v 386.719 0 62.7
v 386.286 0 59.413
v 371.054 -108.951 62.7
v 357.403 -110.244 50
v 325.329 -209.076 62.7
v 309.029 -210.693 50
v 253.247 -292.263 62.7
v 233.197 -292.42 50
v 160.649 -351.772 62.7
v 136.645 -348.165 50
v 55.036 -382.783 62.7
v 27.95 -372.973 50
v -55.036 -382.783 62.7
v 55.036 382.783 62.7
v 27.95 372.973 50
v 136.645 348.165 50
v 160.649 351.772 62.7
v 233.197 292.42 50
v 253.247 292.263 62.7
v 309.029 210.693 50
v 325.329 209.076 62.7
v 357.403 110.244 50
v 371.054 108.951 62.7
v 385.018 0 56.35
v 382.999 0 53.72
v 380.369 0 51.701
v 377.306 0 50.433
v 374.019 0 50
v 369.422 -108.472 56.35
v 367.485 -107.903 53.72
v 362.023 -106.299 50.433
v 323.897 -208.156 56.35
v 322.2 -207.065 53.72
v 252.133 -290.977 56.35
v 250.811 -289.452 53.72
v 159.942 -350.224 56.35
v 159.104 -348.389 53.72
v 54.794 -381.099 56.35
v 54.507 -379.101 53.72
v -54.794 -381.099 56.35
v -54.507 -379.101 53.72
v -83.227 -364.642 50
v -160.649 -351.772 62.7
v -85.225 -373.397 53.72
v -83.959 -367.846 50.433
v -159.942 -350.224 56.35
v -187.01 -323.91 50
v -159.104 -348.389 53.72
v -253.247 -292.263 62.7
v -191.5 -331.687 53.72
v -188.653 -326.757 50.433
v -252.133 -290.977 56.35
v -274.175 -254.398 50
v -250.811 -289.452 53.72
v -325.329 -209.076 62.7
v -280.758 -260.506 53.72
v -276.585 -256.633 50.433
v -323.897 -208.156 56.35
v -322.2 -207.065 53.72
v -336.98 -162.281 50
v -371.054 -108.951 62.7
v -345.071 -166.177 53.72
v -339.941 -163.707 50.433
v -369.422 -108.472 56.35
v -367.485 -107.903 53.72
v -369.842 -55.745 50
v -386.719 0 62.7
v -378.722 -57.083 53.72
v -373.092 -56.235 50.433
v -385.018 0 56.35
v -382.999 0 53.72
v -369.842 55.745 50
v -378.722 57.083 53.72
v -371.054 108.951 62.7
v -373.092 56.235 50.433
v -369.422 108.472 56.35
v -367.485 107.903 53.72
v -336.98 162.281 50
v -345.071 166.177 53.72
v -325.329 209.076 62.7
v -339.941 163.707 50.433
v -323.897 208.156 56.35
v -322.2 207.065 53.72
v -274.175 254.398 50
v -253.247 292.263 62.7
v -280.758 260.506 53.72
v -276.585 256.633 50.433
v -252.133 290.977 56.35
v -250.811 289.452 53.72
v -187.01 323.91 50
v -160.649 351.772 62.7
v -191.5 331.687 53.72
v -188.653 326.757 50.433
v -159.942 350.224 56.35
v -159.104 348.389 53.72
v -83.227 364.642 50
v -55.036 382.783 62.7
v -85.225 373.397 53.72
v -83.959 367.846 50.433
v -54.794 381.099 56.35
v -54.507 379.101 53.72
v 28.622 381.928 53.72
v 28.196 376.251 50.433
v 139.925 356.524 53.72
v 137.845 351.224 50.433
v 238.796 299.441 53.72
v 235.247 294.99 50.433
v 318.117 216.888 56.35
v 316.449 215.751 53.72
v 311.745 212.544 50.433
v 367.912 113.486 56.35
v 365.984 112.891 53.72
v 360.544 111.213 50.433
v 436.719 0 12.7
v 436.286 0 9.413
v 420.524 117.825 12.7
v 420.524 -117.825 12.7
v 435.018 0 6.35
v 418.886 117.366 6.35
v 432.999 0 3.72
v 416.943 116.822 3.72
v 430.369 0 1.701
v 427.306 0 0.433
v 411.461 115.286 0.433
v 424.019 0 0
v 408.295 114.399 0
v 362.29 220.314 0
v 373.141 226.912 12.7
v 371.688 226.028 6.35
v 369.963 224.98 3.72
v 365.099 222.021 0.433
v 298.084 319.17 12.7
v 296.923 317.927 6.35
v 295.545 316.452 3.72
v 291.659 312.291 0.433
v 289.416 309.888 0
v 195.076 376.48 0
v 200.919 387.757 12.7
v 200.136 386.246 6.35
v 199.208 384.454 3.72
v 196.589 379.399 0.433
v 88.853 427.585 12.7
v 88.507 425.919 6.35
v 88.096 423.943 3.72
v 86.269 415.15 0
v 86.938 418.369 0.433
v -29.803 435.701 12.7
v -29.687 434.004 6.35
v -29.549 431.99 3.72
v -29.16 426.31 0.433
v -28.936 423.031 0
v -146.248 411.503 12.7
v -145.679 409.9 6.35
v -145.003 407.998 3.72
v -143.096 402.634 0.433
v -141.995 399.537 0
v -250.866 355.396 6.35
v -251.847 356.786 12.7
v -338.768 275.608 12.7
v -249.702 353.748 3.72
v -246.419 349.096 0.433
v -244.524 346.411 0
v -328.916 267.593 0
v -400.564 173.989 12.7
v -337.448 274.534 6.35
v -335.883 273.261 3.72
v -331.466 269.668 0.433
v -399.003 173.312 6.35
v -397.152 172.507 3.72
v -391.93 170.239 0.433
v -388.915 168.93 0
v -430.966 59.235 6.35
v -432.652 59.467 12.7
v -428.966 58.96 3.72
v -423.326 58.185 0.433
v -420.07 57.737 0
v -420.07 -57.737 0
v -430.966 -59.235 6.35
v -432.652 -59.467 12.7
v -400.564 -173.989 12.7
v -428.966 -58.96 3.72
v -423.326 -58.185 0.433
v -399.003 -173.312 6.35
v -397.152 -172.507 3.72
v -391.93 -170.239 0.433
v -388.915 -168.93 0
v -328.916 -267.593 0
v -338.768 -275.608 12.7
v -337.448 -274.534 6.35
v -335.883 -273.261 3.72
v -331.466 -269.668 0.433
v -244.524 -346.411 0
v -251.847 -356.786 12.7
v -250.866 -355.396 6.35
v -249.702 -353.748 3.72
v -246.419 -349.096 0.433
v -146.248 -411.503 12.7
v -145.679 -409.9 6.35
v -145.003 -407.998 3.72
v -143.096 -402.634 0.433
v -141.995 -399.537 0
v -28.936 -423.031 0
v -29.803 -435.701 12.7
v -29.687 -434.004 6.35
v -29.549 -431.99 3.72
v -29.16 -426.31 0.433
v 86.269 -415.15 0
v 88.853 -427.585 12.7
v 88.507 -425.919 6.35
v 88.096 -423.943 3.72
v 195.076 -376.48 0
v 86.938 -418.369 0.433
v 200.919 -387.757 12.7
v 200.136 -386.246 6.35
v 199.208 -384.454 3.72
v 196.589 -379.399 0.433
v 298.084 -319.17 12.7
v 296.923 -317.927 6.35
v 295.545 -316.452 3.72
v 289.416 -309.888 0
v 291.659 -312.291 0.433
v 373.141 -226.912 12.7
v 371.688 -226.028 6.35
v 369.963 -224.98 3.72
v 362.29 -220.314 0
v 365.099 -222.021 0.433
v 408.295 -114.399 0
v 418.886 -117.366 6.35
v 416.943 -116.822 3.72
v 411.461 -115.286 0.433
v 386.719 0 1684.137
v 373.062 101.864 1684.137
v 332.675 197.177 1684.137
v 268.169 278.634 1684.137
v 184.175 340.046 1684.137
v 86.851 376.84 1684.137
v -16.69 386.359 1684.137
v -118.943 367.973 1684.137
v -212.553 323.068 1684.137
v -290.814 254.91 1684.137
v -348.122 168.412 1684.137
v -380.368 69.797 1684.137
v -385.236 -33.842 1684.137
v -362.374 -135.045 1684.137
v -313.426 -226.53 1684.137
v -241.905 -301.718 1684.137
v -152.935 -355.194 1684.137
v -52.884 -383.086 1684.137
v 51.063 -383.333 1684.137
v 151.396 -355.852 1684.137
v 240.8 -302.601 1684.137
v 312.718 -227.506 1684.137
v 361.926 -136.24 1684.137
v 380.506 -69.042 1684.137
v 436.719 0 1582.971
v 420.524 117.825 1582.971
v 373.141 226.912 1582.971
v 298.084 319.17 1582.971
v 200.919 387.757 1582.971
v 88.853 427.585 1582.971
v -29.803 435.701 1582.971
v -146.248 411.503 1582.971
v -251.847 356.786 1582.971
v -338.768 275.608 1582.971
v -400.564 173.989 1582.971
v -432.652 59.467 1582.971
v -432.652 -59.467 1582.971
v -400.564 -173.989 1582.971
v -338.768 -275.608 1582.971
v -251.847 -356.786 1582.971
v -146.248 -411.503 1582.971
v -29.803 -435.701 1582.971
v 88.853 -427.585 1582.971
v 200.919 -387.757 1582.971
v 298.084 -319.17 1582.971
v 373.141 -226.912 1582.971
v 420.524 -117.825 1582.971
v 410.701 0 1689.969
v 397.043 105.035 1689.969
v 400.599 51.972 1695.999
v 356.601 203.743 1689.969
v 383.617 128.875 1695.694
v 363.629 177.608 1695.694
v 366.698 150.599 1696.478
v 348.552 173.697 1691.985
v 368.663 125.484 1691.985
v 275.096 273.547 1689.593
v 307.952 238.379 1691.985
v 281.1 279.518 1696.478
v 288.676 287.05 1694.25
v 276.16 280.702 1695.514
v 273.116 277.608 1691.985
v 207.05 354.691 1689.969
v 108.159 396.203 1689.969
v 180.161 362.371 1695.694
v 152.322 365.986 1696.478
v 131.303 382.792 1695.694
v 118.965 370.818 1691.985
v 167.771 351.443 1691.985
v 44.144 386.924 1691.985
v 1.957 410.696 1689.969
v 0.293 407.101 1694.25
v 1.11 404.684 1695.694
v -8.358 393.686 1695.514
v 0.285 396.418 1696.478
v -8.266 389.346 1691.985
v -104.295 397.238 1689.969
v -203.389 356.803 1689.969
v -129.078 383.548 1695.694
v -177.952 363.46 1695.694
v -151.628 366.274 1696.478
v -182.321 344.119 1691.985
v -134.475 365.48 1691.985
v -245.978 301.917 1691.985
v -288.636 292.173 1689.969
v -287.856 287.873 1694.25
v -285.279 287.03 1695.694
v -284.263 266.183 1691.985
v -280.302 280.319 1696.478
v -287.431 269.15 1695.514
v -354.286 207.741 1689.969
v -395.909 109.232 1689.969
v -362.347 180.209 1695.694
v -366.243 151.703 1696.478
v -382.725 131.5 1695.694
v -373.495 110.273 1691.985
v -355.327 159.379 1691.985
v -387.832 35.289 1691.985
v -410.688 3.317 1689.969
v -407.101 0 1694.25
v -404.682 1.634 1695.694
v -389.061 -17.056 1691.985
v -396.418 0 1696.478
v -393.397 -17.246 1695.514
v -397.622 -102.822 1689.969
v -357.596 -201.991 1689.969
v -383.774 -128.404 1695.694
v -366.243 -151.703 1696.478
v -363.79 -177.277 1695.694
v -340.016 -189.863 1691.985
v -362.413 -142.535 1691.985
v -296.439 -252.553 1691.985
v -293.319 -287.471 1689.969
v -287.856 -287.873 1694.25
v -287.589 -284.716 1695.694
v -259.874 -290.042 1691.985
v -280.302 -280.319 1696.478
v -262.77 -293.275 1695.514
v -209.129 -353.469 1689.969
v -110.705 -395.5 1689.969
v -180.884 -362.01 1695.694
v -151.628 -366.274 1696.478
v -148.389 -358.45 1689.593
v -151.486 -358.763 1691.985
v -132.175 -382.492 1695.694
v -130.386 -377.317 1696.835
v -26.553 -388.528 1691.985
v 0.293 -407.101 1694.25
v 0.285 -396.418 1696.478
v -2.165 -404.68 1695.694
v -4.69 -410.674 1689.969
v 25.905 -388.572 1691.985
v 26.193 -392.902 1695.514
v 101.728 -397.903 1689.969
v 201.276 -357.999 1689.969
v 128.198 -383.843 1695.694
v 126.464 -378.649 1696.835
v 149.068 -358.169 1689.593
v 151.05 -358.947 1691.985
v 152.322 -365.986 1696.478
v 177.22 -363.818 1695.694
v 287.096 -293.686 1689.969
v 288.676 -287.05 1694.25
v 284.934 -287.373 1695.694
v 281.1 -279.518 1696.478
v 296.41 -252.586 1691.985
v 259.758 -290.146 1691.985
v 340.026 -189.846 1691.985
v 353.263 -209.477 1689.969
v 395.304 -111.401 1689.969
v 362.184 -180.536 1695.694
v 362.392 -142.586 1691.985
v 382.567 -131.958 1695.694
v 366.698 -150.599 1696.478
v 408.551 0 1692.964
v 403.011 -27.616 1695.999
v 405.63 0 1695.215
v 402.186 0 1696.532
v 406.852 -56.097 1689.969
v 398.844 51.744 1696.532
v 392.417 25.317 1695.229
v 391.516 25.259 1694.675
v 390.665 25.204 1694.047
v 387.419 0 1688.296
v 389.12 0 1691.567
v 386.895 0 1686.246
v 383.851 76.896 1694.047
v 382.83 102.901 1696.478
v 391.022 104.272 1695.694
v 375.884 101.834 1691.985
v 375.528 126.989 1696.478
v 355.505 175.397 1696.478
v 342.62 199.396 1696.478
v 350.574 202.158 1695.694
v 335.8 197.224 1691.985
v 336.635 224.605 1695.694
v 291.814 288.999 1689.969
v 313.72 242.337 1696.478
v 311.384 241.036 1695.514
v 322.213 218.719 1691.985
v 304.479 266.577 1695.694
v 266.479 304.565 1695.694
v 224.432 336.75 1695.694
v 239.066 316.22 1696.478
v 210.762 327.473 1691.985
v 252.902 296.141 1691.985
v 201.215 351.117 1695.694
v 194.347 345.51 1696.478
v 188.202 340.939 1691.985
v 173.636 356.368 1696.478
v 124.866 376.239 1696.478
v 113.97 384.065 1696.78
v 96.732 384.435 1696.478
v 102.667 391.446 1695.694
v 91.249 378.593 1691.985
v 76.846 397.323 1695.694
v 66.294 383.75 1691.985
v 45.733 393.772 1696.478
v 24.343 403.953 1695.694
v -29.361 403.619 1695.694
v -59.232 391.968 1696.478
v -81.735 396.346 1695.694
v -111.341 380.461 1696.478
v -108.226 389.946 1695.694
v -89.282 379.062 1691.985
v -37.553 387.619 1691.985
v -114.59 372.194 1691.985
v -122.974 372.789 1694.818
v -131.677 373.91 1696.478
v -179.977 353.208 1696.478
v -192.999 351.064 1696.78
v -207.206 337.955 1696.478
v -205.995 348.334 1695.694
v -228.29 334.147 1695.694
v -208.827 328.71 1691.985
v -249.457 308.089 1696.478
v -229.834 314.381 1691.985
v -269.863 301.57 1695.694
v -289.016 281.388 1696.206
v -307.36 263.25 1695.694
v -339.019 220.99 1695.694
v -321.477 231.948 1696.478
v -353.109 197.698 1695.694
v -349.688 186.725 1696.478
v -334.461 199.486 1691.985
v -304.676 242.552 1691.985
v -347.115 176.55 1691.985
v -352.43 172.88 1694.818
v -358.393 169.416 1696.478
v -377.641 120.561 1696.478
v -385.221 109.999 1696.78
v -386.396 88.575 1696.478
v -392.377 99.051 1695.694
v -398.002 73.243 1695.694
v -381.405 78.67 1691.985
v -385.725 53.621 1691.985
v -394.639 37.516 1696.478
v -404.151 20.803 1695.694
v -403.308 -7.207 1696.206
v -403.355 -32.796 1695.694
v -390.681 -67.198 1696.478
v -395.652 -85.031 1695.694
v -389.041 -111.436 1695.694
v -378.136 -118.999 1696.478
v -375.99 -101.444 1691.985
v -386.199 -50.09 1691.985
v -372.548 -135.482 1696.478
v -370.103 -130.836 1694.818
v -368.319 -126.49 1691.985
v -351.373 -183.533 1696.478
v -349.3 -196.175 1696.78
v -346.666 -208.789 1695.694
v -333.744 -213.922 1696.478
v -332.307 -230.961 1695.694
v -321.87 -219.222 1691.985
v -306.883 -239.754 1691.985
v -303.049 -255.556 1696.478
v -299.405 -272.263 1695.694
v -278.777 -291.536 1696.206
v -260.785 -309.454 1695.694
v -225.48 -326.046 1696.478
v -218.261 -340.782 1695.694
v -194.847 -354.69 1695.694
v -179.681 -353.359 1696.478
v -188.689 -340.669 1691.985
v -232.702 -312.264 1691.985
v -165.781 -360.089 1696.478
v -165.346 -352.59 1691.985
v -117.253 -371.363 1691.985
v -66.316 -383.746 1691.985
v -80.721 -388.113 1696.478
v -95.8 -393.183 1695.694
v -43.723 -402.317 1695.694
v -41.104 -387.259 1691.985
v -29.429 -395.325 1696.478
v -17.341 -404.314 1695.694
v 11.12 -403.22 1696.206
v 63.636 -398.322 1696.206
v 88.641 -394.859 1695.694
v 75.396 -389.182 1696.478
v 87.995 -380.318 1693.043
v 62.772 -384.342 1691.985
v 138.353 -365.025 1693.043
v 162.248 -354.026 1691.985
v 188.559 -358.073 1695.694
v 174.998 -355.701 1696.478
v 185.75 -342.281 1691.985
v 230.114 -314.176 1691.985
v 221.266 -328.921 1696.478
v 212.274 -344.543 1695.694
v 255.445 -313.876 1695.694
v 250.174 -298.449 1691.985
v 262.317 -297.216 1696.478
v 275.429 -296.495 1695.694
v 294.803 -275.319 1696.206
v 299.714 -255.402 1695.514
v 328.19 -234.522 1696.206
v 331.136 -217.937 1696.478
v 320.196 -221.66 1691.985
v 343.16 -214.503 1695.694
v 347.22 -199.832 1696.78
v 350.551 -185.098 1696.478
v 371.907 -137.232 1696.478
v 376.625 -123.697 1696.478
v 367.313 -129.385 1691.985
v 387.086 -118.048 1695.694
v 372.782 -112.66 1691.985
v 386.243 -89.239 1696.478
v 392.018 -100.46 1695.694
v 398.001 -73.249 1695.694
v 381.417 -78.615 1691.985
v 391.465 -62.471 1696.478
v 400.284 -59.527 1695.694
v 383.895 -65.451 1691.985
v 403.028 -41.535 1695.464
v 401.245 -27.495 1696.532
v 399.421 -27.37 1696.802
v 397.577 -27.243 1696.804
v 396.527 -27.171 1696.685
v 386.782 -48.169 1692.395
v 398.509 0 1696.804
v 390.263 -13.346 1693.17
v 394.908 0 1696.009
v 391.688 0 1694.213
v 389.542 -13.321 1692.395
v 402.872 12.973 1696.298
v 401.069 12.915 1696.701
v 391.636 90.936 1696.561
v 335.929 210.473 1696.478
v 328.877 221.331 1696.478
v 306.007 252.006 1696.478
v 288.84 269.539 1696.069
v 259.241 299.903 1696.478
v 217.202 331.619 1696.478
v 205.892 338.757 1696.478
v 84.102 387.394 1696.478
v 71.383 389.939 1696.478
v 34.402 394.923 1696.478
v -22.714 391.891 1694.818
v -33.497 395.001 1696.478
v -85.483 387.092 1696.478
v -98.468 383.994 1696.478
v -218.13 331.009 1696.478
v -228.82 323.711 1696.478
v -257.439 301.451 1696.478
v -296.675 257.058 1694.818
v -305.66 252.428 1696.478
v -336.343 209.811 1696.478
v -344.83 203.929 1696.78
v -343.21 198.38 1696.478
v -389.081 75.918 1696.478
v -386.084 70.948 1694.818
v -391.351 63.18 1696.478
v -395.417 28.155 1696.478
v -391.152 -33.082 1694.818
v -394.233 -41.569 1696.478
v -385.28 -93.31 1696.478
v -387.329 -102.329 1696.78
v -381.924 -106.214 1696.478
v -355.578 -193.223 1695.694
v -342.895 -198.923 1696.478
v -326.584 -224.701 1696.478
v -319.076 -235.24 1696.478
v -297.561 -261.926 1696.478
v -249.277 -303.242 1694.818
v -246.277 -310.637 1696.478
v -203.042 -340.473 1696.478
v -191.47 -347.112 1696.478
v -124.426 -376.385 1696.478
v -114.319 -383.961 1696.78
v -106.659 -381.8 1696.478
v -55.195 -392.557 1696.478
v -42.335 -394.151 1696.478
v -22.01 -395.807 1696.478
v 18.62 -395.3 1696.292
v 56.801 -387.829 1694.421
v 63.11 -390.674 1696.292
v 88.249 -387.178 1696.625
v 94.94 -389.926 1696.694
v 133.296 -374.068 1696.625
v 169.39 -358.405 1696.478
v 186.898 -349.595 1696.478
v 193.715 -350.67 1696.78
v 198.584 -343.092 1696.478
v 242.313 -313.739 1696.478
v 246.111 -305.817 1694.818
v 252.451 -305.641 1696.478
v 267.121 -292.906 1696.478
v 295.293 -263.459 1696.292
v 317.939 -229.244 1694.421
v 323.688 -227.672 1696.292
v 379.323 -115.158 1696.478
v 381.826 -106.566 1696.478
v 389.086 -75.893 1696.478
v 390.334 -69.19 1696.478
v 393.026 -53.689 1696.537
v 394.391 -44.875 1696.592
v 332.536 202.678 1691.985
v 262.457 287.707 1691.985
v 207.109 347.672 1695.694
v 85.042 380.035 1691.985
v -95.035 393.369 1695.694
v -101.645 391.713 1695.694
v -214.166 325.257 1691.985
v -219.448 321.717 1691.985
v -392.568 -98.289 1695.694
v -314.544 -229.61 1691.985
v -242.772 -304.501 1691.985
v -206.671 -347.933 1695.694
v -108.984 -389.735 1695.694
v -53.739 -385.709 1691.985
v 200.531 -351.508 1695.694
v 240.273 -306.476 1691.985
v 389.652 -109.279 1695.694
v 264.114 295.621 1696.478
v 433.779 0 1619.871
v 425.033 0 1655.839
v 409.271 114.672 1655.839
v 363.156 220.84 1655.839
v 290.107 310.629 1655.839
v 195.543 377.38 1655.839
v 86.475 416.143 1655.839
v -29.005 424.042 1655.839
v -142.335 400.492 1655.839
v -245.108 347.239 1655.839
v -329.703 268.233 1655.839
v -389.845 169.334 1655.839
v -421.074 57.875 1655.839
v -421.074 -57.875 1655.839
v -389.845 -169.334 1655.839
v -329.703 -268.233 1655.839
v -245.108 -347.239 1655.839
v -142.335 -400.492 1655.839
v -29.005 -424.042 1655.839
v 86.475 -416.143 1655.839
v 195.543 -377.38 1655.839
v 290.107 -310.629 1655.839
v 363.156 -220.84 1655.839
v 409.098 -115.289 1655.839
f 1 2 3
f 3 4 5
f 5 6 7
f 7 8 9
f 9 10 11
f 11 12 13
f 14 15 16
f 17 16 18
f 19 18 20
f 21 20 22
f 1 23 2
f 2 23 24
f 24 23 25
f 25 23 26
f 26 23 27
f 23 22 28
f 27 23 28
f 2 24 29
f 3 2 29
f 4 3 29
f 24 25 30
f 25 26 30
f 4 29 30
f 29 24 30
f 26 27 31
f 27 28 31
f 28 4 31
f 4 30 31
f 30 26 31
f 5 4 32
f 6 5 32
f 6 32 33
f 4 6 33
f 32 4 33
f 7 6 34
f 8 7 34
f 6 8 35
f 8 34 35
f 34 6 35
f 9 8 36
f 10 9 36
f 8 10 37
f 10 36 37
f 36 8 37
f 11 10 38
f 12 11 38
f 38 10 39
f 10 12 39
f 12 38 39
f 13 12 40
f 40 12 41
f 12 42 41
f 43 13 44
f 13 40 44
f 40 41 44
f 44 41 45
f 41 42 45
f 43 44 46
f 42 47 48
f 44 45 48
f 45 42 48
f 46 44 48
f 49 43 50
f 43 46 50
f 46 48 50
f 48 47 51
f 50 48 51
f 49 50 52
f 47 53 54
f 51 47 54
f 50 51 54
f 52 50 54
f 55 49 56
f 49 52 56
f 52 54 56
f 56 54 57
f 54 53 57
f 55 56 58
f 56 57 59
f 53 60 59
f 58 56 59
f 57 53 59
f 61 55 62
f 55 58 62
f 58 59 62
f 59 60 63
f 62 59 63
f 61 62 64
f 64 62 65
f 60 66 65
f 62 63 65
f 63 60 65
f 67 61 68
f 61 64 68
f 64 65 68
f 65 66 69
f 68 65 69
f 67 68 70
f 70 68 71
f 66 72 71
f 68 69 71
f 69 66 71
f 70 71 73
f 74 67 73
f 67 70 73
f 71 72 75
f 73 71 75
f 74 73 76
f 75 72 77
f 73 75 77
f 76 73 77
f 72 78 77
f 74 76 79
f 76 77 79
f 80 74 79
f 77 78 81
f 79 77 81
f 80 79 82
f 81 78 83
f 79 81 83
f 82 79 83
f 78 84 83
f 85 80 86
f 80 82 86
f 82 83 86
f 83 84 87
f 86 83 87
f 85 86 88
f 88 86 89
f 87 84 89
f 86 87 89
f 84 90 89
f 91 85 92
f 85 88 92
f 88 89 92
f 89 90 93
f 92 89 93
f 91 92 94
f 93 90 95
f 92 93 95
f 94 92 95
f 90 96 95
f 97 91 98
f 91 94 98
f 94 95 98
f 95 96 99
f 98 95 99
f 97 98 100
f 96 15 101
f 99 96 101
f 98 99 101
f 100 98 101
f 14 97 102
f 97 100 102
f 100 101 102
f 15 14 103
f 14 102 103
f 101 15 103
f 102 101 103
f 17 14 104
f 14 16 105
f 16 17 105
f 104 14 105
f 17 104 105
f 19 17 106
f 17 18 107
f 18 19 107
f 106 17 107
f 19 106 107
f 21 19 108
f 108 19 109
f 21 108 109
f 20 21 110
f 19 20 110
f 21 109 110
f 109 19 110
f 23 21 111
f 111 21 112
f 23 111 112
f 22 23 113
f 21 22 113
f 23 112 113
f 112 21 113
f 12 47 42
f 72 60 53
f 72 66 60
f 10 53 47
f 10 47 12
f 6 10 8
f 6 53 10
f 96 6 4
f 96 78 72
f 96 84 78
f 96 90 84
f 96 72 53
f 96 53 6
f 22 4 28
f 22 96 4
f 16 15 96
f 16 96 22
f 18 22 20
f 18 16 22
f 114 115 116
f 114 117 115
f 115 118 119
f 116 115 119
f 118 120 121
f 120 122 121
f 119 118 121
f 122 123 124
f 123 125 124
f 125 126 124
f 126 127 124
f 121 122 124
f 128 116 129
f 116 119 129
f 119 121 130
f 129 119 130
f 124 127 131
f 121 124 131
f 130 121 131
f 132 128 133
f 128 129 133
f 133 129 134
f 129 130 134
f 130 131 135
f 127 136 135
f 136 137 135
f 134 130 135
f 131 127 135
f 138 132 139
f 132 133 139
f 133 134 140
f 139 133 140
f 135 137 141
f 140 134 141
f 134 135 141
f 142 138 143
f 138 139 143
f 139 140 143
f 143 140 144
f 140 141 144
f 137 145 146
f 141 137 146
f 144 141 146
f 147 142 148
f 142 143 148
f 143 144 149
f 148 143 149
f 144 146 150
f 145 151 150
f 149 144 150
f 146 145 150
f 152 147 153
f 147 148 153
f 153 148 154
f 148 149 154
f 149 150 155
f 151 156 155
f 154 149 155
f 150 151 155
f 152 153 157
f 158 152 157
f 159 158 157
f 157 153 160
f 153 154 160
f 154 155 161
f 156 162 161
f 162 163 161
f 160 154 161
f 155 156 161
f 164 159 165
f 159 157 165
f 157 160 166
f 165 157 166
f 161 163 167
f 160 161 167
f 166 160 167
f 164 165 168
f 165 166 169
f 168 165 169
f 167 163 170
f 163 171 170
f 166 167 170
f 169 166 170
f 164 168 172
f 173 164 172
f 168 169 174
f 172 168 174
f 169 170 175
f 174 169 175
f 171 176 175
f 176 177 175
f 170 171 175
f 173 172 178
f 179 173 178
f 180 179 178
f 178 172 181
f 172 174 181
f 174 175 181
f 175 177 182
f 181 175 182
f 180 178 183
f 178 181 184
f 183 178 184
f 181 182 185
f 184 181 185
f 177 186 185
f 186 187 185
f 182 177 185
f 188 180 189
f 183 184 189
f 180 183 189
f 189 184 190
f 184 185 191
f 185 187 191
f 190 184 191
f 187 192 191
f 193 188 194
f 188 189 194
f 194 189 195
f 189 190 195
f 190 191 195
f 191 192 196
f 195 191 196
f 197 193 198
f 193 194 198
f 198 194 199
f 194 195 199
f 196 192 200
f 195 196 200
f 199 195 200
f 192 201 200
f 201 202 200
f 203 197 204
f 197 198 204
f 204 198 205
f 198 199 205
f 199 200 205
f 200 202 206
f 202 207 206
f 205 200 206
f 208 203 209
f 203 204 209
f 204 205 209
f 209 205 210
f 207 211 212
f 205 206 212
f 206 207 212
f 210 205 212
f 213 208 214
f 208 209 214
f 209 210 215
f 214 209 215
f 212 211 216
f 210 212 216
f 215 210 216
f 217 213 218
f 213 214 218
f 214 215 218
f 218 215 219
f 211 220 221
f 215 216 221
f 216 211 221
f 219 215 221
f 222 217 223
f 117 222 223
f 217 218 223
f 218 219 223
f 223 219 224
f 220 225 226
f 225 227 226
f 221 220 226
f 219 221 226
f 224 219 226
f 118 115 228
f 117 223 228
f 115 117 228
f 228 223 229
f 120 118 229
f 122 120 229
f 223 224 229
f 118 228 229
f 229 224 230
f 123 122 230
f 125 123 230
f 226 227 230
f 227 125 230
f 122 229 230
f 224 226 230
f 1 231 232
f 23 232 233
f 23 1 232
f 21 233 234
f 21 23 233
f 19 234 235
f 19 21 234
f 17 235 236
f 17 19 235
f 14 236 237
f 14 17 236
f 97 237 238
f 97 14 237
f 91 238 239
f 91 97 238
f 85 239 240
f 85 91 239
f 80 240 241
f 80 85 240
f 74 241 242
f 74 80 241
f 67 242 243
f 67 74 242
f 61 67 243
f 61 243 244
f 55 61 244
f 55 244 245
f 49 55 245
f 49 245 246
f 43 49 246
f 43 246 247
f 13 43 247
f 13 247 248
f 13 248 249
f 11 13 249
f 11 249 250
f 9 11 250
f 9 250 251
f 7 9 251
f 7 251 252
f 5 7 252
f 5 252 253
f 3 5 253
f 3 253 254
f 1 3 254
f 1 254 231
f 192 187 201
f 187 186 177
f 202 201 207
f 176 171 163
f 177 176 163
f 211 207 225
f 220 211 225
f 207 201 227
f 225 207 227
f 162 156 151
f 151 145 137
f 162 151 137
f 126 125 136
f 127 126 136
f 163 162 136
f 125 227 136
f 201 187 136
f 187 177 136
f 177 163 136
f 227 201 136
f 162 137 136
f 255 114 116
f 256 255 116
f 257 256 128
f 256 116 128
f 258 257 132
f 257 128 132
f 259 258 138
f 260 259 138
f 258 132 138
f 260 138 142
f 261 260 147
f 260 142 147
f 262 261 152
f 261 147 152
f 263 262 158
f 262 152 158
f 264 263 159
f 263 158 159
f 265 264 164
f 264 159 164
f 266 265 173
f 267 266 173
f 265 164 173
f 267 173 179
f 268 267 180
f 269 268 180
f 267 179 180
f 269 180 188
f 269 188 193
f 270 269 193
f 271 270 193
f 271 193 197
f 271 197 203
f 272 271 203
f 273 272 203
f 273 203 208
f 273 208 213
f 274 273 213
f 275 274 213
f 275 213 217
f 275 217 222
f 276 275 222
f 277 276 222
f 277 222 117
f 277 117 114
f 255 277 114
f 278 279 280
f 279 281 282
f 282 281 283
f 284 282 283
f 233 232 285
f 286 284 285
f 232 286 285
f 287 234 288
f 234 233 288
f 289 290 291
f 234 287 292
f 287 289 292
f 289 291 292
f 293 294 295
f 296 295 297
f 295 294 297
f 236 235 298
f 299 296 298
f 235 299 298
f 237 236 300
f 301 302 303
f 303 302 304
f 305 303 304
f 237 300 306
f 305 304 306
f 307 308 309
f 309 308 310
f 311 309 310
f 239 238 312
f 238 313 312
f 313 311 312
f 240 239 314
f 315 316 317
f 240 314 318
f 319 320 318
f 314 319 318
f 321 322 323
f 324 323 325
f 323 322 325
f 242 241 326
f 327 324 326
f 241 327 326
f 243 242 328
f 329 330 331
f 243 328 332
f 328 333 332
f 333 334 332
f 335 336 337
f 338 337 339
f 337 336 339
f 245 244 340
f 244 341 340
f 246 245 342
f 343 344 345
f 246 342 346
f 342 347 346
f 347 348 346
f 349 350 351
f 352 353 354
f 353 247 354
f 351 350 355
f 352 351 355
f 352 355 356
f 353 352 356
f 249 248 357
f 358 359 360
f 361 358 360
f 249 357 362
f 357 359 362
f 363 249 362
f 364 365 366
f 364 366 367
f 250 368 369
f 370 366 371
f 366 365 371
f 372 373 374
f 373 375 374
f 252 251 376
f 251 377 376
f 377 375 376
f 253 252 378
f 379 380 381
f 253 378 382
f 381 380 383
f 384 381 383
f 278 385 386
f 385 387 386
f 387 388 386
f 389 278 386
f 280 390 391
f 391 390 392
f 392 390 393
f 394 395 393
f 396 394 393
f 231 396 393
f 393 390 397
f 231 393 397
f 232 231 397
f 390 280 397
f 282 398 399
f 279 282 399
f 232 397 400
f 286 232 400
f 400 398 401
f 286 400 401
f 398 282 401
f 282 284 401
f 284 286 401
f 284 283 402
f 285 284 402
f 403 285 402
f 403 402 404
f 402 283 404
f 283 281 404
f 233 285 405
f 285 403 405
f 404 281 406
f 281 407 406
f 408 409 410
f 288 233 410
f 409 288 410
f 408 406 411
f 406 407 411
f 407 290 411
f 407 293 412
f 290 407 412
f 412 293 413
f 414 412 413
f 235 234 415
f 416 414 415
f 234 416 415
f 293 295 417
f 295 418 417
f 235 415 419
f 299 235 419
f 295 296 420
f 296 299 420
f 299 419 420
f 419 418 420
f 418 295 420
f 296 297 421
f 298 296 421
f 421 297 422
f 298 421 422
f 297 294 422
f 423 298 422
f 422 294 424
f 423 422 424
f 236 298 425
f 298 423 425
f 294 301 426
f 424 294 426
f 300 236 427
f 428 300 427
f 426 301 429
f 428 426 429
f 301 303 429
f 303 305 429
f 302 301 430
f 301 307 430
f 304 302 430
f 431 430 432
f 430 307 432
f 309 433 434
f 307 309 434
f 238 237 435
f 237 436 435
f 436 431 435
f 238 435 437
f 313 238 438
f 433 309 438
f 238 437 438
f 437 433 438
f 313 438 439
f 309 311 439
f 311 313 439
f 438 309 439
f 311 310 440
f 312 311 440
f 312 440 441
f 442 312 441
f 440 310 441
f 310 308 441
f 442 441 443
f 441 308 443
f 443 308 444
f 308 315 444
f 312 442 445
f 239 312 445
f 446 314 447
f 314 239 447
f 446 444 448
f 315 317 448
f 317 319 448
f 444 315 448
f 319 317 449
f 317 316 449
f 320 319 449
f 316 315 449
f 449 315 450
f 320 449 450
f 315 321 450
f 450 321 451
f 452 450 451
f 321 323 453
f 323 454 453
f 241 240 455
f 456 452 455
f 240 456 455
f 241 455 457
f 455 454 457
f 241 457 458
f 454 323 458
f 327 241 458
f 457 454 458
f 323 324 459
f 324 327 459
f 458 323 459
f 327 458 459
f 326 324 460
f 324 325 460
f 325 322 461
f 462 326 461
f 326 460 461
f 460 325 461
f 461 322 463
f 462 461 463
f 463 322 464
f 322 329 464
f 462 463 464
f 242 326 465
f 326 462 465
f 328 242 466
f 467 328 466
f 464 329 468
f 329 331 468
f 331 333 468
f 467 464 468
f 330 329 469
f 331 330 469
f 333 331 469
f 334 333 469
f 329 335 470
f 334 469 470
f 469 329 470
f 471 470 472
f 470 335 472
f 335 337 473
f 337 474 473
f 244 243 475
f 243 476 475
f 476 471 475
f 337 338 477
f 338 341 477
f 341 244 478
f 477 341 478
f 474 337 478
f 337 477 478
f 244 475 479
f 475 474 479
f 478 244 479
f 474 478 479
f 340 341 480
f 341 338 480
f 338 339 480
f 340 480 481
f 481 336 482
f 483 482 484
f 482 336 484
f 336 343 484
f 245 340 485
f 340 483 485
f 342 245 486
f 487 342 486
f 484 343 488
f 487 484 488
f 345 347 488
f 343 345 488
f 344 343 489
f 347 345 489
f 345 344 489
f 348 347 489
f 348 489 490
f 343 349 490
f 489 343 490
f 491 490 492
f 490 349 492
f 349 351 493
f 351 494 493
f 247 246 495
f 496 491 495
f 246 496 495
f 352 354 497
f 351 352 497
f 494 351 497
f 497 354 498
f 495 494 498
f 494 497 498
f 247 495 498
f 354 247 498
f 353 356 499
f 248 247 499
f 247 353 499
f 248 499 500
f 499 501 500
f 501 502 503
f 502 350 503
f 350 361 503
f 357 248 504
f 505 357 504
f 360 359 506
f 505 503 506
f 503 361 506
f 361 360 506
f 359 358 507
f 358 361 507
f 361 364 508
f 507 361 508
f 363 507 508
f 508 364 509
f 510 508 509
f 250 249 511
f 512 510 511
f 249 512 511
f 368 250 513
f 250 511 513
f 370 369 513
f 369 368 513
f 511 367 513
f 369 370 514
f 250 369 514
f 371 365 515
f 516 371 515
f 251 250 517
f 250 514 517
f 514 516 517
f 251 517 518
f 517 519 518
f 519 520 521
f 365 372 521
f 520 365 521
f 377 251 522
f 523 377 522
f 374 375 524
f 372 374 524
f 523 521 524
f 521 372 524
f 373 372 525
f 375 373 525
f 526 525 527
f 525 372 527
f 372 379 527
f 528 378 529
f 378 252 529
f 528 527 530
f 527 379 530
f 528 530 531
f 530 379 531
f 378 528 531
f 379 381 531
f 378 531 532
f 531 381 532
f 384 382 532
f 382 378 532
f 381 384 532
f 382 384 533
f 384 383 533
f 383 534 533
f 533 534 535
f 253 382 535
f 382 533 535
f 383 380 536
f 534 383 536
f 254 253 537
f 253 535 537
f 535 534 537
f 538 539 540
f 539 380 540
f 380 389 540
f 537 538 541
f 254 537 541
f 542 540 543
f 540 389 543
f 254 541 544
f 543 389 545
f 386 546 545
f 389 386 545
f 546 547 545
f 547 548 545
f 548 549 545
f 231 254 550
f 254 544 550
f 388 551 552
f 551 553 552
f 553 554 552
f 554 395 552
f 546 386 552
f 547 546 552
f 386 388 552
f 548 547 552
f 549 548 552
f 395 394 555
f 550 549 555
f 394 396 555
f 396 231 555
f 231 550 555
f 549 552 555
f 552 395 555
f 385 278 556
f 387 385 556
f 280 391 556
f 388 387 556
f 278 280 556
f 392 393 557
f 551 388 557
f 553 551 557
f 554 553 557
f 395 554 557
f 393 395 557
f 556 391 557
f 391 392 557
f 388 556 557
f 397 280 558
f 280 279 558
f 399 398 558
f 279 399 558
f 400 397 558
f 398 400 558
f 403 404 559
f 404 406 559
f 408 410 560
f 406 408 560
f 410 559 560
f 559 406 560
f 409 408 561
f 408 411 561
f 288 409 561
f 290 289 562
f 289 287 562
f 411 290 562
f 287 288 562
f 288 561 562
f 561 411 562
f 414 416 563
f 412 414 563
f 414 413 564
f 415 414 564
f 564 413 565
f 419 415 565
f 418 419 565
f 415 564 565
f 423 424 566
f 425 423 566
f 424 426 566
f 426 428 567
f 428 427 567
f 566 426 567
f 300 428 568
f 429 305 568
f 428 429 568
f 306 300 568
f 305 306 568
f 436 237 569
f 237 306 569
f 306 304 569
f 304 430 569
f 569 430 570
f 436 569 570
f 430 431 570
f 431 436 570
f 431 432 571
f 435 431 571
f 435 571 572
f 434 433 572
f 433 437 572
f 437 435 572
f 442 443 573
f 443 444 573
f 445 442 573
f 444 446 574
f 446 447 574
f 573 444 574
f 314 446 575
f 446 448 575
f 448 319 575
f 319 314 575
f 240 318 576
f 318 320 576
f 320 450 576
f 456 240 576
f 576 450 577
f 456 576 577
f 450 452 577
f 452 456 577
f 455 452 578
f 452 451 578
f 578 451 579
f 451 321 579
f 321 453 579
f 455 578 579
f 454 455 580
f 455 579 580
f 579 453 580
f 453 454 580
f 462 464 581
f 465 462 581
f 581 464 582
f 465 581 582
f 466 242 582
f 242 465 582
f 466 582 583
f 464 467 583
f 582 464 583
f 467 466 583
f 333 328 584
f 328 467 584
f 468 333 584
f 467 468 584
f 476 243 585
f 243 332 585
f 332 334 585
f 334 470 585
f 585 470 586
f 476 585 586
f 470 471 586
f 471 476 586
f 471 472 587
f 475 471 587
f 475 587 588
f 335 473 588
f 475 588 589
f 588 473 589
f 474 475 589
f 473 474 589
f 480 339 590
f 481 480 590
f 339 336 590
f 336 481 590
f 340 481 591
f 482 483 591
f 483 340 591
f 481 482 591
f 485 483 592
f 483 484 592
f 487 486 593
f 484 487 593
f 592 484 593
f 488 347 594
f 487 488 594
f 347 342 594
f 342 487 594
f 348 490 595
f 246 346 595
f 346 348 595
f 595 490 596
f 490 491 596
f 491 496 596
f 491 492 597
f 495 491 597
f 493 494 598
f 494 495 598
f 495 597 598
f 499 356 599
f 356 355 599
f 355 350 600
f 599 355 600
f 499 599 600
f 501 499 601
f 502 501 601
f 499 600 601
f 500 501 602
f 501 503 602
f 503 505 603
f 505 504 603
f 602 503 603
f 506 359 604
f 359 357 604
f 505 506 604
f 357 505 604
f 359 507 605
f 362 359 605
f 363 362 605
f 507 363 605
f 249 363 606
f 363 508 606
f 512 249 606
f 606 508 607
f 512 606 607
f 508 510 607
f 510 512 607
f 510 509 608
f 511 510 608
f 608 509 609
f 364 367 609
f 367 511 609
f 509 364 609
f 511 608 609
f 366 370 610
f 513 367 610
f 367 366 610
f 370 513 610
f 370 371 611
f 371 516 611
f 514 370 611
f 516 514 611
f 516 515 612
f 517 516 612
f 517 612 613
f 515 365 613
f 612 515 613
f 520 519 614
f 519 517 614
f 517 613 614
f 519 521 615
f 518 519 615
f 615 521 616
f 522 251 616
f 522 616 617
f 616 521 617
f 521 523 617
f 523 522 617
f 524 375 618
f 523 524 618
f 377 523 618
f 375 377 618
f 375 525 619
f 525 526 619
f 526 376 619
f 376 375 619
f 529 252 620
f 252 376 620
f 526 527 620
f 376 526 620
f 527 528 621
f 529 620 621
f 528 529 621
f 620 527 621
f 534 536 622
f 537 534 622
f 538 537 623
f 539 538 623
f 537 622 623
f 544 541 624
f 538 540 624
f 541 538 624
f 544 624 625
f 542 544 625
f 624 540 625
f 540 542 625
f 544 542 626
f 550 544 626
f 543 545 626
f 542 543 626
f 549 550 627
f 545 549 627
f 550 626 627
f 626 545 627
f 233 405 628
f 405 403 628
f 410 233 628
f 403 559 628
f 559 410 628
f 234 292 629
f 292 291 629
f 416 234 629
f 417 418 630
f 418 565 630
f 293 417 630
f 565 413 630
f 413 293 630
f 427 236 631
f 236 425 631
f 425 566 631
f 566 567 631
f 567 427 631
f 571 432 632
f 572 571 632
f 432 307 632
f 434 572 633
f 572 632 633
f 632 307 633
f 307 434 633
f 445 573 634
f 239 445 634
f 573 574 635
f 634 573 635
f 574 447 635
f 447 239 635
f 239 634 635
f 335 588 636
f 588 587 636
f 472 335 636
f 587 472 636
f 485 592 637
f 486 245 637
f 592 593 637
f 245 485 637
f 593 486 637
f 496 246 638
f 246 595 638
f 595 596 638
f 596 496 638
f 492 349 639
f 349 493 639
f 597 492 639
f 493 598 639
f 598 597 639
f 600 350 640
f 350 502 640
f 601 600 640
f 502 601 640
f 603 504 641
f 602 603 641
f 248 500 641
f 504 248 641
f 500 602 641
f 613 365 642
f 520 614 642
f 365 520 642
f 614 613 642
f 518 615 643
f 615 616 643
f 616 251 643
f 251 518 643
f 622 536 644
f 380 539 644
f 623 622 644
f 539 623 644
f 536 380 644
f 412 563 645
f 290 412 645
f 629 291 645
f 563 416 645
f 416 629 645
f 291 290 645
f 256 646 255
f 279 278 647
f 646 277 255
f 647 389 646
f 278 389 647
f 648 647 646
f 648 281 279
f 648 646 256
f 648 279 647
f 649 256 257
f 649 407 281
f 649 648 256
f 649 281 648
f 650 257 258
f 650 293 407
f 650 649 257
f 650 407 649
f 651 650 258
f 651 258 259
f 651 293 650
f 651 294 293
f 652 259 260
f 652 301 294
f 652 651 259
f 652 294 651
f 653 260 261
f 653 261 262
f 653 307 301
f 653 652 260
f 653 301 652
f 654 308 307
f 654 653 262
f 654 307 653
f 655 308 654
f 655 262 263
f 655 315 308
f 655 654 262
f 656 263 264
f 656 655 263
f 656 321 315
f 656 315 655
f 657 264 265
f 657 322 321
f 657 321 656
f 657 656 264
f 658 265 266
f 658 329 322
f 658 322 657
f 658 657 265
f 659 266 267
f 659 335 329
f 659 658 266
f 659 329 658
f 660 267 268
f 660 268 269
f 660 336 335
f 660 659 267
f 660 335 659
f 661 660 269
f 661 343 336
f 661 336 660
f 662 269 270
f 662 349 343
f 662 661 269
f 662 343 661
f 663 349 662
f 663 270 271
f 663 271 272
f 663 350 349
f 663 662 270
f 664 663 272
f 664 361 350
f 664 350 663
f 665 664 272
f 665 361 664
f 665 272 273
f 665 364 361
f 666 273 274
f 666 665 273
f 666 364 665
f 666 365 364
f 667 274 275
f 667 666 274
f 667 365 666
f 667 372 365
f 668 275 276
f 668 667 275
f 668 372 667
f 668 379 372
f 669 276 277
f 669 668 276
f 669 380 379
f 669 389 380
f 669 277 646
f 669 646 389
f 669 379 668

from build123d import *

# Parameters (mm, degrees)
F0_R     = 436.7191768954
F1_DEPTH = 1727.2
F2_T     = -50
F4_R     = 12.7


# Not quite as in the source:
# - a fillet or chamfer that OpenCascade refuses, or shapes differently, is made with other operations: its cross-section is extruded or revolved along the edge and cut away or added


with BuildPart() as f1:
    # F0 (on Top) → F1 (new body)
    with BuildSketch(Plane.XY):
        Circle(F0_R)
    extrude(amount=F1_DEPTH)

    # F2
    f2_openings = [f1.faces().sort_by_distance(p)[0] for p in [
        (0, 0, 1727.2),
    ]]
    offset(amount=F2_T, openings=f2_openings)

    # F3: fillet of radius 233.0198930403 on 1 edges, made by hand

    # F3_s1 → F3_t2 (revolve, cut)
    with BuildSketch(Plane.XZ):
        with BuildLine():
            ThreePointArc((436.7191768954, 1582.9710524755), (423.8646154278, 1659.2959981093), (386.7191768954, 1727.2))
            Line((386.7191768954, 1727.2), (436.7191768954, 1727.2))
            Line((436.7191768954, 1727.2), (436.7191768954, 1582.9710524755))
        make_face()
    revolve(axis=Axis((0, 0, 1727.2), (0, 0, 1)), mode=Mode.SUBTRACT)

    # F4
    f4_edges = [f1.edges().sort_by_distance(p)[0] for p in [
        (-436.719177, 0, 0),
        (-386.719177, 0, 50),
        (386.719177, 0, 888.6),
        (-386.719177, 0, 1727.2),
    ]]
    fillet(f4_edges, radius=F4_R)


solid = f1.part
